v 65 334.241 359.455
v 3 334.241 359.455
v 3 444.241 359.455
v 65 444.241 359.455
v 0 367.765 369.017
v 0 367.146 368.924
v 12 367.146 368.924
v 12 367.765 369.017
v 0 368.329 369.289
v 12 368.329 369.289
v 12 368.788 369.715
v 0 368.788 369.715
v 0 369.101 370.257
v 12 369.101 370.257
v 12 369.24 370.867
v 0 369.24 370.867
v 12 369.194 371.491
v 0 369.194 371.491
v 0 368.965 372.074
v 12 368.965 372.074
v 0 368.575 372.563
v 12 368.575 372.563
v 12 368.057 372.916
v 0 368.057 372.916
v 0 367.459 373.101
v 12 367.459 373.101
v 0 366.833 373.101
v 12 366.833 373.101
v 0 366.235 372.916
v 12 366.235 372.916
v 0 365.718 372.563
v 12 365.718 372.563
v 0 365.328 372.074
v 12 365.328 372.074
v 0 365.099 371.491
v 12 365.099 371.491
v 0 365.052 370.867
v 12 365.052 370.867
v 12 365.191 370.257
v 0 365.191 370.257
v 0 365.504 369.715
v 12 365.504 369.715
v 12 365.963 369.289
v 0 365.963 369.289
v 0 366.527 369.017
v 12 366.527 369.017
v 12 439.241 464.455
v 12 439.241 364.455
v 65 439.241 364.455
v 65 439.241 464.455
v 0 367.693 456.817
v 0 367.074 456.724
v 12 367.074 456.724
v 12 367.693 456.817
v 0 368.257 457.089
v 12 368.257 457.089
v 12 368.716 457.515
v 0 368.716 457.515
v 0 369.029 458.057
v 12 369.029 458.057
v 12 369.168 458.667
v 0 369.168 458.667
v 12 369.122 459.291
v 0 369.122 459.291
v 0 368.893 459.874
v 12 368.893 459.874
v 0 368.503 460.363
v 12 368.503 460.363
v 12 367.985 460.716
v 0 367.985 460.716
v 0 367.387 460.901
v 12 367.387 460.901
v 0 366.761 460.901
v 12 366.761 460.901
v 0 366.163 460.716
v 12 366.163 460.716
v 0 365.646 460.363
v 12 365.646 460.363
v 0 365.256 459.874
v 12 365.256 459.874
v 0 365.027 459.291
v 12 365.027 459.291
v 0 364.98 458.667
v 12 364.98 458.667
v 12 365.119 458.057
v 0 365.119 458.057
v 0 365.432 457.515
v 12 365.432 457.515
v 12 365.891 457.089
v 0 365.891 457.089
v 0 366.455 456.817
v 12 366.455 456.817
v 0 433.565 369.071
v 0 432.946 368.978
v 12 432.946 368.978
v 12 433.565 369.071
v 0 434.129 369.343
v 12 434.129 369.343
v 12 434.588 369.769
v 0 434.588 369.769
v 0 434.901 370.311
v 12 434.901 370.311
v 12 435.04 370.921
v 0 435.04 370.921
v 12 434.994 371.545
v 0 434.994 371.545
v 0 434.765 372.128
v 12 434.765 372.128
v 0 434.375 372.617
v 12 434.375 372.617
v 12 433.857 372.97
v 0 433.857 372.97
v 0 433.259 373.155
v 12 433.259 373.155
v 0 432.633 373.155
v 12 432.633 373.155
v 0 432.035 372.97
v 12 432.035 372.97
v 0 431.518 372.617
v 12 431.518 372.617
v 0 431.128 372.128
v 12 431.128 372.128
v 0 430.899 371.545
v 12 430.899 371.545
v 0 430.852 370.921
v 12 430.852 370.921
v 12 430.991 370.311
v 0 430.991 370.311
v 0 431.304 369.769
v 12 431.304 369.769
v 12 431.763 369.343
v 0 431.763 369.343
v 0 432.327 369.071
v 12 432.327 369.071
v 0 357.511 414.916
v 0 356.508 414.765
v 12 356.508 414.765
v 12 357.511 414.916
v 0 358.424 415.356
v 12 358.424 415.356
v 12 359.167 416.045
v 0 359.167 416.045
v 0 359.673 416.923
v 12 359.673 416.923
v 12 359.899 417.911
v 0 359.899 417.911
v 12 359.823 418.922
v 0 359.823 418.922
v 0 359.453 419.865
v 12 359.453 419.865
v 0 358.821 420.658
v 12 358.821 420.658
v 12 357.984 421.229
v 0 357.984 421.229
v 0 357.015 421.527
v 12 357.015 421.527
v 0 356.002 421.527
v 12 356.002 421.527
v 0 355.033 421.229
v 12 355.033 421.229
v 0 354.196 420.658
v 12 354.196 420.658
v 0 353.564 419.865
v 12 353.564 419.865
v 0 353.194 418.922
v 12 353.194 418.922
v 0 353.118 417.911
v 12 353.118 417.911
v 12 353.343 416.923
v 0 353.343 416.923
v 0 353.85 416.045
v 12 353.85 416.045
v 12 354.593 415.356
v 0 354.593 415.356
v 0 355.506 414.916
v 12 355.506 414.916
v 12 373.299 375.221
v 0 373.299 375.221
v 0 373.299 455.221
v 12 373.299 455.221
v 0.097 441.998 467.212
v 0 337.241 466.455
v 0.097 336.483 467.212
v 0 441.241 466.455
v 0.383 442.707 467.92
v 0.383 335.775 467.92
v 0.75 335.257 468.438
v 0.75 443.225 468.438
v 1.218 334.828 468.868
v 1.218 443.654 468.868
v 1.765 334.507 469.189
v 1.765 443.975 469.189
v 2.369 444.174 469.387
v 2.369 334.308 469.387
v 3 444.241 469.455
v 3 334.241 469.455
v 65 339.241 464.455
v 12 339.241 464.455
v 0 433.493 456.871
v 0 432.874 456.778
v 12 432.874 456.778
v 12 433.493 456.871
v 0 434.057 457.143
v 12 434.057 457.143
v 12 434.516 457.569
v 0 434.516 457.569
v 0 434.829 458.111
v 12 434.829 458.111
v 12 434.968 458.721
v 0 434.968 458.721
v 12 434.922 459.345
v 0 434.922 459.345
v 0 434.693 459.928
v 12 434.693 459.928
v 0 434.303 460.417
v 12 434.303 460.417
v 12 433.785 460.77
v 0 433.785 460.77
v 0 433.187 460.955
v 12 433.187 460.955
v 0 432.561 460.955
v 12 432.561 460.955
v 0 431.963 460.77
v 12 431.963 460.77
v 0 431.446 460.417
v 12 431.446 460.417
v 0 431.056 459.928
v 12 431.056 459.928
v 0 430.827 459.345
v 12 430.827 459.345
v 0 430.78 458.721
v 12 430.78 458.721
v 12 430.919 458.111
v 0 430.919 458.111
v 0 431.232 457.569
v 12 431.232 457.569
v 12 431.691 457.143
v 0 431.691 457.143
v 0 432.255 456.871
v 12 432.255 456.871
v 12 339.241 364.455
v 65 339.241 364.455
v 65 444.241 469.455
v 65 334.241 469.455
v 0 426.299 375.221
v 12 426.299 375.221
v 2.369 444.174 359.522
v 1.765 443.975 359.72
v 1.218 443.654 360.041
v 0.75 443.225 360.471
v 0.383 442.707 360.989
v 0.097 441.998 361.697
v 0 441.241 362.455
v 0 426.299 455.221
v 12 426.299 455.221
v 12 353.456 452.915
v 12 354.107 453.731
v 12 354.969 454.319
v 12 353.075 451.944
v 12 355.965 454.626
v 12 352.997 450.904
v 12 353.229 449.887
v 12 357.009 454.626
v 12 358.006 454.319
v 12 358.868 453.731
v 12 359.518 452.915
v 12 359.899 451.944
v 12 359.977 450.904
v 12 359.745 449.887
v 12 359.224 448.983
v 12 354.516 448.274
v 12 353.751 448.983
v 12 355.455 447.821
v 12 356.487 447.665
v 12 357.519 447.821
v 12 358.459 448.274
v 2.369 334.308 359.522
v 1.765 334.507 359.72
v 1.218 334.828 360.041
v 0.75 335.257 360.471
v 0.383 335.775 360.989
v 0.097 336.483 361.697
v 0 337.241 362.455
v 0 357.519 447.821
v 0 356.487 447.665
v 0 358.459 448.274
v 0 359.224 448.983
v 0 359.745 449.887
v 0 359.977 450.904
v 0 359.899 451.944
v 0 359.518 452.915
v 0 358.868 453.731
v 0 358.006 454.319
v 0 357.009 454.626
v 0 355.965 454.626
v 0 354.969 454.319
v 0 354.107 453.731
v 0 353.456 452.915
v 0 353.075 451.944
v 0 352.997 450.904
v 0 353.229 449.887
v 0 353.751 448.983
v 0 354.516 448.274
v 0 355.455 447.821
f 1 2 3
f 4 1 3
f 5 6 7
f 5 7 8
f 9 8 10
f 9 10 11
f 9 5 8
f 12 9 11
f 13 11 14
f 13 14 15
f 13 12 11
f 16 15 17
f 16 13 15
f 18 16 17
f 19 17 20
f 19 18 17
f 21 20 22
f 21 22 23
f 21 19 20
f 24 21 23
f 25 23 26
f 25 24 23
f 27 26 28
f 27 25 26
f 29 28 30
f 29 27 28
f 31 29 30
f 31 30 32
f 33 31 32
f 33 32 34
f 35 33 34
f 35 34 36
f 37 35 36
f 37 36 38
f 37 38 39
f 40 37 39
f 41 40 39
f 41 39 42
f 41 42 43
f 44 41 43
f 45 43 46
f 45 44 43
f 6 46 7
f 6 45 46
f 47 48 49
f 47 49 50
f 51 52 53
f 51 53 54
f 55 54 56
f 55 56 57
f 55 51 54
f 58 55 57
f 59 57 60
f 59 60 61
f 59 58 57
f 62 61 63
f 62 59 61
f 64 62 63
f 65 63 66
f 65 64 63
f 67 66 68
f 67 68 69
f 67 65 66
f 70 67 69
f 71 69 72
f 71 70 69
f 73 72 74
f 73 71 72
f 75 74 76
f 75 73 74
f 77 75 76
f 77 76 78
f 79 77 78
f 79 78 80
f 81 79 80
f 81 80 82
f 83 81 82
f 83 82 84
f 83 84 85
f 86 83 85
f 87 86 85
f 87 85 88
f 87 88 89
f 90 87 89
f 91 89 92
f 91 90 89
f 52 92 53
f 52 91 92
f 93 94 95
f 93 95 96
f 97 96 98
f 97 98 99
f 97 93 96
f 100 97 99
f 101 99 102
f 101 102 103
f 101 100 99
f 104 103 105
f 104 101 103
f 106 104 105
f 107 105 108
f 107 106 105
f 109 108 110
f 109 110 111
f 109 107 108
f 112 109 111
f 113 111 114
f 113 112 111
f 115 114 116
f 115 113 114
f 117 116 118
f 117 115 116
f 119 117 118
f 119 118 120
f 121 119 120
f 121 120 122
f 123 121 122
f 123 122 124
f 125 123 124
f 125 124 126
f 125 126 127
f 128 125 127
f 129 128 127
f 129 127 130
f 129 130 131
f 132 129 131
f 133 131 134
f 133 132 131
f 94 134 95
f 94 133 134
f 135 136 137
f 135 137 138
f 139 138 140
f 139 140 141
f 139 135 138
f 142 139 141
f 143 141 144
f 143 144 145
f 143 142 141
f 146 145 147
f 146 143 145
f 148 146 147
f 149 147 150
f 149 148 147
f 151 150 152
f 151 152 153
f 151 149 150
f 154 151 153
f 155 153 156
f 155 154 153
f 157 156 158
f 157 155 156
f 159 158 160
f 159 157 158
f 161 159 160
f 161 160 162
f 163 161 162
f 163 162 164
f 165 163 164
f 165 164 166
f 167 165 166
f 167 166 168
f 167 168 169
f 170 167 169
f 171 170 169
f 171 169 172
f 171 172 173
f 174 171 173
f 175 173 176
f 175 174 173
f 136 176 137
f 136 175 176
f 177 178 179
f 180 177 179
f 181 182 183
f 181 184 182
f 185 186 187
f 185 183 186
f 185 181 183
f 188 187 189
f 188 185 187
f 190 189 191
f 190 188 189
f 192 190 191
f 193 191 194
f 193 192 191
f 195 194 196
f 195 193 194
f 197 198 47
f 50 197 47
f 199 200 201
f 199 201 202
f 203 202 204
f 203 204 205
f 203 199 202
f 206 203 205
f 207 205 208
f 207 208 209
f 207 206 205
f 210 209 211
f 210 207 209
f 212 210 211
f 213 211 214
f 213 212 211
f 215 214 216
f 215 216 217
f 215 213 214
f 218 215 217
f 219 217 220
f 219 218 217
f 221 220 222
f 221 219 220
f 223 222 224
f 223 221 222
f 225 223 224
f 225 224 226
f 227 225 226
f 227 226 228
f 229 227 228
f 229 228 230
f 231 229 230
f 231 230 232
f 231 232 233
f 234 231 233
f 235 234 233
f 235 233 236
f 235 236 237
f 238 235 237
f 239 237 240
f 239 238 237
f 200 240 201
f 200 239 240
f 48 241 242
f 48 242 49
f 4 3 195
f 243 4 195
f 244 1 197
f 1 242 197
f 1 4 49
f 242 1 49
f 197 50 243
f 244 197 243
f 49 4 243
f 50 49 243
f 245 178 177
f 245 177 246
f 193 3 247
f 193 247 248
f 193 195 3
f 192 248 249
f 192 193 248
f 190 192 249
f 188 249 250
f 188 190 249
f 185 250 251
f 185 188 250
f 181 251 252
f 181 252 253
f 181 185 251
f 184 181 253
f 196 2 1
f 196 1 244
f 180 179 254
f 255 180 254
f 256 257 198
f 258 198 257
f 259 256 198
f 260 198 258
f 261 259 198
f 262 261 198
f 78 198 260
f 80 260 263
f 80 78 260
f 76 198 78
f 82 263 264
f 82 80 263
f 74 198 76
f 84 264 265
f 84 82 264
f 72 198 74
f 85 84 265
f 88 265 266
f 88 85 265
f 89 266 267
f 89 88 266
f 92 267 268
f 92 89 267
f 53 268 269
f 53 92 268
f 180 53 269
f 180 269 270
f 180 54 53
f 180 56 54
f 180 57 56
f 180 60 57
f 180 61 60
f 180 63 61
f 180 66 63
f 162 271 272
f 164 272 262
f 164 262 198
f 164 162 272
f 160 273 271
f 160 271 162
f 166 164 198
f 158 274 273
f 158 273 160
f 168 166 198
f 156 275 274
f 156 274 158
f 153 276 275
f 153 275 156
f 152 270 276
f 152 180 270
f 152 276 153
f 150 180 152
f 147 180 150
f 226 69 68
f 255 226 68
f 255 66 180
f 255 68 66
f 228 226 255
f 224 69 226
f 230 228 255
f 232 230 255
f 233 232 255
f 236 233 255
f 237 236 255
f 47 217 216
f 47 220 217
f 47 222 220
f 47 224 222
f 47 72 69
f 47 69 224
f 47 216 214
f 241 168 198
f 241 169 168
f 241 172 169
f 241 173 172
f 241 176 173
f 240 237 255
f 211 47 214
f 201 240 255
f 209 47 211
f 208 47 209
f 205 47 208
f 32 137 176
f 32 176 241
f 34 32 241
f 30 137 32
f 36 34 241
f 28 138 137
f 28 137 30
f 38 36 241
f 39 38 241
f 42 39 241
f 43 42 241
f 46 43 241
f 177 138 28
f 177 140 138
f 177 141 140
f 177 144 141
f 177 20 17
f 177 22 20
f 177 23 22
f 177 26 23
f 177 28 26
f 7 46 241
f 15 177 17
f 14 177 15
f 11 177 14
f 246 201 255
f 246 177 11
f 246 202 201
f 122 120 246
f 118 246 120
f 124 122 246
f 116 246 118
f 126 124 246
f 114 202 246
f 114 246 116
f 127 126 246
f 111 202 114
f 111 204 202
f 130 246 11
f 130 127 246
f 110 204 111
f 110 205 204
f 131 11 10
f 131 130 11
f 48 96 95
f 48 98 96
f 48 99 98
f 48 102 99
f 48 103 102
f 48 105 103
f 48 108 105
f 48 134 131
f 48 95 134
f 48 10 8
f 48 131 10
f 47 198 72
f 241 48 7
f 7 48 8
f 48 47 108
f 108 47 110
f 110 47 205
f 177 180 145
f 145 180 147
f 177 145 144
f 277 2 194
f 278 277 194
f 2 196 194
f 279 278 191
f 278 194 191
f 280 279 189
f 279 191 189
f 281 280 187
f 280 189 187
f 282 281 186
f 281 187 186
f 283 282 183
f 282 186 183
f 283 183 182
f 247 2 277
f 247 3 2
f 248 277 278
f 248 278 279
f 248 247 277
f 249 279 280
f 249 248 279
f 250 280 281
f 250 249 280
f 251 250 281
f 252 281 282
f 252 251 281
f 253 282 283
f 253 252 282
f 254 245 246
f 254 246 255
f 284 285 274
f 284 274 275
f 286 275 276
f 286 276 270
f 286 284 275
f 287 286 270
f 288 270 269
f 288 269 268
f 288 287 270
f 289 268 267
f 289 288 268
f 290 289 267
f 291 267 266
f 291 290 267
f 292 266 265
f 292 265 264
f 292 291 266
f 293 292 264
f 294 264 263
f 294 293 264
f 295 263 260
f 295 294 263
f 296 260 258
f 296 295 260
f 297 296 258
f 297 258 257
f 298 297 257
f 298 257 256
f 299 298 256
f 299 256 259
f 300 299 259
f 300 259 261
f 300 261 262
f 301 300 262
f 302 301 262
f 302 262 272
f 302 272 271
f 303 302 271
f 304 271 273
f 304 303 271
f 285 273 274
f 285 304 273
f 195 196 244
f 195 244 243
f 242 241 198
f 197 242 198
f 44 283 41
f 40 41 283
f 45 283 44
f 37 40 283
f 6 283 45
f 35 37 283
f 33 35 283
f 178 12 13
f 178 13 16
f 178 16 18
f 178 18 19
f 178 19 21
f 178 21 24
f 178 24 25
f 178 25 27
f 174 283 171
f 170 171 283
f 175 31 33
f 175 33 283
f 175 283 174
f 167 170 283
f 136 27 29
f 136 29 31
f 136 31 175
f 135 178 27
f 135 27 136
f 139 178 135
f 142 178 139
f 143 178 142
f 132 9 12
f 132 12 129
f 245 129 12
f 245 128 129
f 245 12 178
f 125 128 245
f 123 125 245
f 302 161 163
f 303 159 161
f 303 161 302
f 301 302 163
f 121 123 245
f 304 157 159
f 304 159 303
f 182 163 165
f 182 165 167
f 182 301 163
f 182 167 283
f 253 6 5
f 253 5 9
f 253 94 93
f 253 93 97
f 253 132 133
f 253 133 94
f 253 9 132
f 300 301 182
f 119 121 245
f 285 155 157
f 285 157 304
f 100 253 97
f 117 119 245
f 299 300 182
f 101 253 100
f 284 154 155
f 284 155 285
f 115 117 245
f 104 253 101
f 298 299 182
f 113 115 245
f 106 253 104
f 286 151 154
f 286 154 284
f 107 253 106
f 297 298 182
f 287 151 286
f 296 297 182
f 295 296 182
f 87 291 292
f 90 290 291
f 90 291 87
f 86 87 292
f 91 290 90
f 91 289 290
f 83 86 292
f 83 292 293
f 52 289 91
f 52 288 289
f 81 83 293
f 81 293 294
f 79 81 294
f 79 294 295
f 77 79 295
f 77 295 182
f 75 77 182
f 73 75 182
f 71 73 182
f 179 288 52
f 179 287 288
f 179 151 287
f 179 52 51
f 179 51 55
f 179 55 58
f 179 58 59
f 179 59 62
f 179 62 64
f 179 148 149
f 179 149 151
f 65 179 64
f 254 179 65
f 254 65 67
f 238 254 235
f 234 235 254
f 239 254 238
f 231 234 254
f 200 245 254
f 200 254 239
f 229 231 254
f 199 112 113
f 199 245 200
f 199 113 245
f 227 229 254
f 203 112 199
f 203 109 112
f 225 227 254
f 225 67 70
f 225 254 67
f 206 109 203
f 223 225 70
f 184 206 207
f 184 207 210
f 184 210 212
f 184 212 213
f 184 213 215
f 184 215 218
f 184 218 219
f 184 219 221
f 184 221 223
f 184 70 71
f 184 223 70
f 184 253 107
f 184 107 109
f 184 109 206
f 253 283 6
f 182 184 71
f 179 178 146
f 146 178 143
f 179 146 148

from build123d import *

# Parameters (mm, degrees)
ESBO_O1_W                = 100
ESBO_O1_H                = 100
ESBO_O1_R                = 2.099999731
ESBO_O1_R_2              = 3.499999496
ESBO_O1_R_3              = 3.399999765
RESSALTO_EXTRUS_O1_DEPTH = 12
ESBO_O2_W                = 80
ESBO_O2_H                = 53
CORTE_EXTRUS_O1_DEPTH    = 12
ESBO_O3_W                = 110
ESBO_O3_H                = 110
ESBO_O3_W_2              = 100
ESBO_O3_H_2              = 100
RESSALTO_EXTRUS_O2_DEPTH = 65
FILETE1_R                = 3


with BuildPart() as part:
    # Esboço1 → Ressalto-extrusão1 (new body)
    with BuildSketch(Plane(origin=(0, 0, 0), x_dir=(0, 0, -1), z_dir=(1, 0, 0))):
        with Locations((-414.454548573, 389.240771296)):
            Rectangle(ESBO_O1_W, ESBO_O1_H)
        with Locations((-371.077987612, 432.946200958)):
            Circle(ESBO_O1_R, mode=Mode.SUBTRACT)
        with Locations((-371.024063379, 367.14624515)):
            Circle(ESBO_O1_R, mode=Mode.SUBTRACT)
        with Locations((-458.877958129, 432.87424738)):
            Circle(ESBO_O1_R, mode=Mode.SUBTRACT)
        with Locations((-458.824033895, 367.074291572)):
            Circle(ESBO_O1_R, mode=Mode.SUBTRACT)
        with Locations((-451.165348634, 356.487124133)):
            Circle(ESBO_O1_R_2, mode=Mode.SUBTRACT)
        with Locations((-418.165360481, 356.508431567)):
            Circle(ESBO_O1_R_3, mode=Mode.SUBTRACT)
    extrude(amount=RESSALTO_EXTRUS_O1_DEPTH)

    # Esboço2 → Corte-extrusão1 (cut)
    with BuildSketch(Plane.ZY):
        with Locations((415.220911045, 399.798918519)):
            Rectangle(ESBO_O2_W, ESBO_O2_H)
    extrude(amount=-CORTE_EXTRUS_O1_DEPTH, mode=Mode.SUBTRACT)

    # Esboço3 → Ressalto-extrusão2 (add)
    with BuildSketch(Plane.ZY):
        with Locations((414.454548573, 389.240771296)):
            Rectangle(ESBO_O3_W, ESBO_O3_H)
        with Locations((414.454548573, 389.240771296)):
            Rectangle(ESBO_O3_W_2, ESBO_O3_H_2, mode=Mode.SUBTRACT)
    extrude(amount=-RESSALTO_EXTRUS_O2_DEPTH)

    # Filete1
    filete1_edges = [part.edges().sort_by_distance(p)[0] for p in [
        (0, 444.240771296, 414.454548573),
        (0, 389.240771296, 359.454548573),
        (0, 334.240771296, 414.454548573),
        (0, 389.240771296, 469.454548573),
    ]]
    fillet(filete1_edges, radius=FILETE1_R)


solid = part.part
